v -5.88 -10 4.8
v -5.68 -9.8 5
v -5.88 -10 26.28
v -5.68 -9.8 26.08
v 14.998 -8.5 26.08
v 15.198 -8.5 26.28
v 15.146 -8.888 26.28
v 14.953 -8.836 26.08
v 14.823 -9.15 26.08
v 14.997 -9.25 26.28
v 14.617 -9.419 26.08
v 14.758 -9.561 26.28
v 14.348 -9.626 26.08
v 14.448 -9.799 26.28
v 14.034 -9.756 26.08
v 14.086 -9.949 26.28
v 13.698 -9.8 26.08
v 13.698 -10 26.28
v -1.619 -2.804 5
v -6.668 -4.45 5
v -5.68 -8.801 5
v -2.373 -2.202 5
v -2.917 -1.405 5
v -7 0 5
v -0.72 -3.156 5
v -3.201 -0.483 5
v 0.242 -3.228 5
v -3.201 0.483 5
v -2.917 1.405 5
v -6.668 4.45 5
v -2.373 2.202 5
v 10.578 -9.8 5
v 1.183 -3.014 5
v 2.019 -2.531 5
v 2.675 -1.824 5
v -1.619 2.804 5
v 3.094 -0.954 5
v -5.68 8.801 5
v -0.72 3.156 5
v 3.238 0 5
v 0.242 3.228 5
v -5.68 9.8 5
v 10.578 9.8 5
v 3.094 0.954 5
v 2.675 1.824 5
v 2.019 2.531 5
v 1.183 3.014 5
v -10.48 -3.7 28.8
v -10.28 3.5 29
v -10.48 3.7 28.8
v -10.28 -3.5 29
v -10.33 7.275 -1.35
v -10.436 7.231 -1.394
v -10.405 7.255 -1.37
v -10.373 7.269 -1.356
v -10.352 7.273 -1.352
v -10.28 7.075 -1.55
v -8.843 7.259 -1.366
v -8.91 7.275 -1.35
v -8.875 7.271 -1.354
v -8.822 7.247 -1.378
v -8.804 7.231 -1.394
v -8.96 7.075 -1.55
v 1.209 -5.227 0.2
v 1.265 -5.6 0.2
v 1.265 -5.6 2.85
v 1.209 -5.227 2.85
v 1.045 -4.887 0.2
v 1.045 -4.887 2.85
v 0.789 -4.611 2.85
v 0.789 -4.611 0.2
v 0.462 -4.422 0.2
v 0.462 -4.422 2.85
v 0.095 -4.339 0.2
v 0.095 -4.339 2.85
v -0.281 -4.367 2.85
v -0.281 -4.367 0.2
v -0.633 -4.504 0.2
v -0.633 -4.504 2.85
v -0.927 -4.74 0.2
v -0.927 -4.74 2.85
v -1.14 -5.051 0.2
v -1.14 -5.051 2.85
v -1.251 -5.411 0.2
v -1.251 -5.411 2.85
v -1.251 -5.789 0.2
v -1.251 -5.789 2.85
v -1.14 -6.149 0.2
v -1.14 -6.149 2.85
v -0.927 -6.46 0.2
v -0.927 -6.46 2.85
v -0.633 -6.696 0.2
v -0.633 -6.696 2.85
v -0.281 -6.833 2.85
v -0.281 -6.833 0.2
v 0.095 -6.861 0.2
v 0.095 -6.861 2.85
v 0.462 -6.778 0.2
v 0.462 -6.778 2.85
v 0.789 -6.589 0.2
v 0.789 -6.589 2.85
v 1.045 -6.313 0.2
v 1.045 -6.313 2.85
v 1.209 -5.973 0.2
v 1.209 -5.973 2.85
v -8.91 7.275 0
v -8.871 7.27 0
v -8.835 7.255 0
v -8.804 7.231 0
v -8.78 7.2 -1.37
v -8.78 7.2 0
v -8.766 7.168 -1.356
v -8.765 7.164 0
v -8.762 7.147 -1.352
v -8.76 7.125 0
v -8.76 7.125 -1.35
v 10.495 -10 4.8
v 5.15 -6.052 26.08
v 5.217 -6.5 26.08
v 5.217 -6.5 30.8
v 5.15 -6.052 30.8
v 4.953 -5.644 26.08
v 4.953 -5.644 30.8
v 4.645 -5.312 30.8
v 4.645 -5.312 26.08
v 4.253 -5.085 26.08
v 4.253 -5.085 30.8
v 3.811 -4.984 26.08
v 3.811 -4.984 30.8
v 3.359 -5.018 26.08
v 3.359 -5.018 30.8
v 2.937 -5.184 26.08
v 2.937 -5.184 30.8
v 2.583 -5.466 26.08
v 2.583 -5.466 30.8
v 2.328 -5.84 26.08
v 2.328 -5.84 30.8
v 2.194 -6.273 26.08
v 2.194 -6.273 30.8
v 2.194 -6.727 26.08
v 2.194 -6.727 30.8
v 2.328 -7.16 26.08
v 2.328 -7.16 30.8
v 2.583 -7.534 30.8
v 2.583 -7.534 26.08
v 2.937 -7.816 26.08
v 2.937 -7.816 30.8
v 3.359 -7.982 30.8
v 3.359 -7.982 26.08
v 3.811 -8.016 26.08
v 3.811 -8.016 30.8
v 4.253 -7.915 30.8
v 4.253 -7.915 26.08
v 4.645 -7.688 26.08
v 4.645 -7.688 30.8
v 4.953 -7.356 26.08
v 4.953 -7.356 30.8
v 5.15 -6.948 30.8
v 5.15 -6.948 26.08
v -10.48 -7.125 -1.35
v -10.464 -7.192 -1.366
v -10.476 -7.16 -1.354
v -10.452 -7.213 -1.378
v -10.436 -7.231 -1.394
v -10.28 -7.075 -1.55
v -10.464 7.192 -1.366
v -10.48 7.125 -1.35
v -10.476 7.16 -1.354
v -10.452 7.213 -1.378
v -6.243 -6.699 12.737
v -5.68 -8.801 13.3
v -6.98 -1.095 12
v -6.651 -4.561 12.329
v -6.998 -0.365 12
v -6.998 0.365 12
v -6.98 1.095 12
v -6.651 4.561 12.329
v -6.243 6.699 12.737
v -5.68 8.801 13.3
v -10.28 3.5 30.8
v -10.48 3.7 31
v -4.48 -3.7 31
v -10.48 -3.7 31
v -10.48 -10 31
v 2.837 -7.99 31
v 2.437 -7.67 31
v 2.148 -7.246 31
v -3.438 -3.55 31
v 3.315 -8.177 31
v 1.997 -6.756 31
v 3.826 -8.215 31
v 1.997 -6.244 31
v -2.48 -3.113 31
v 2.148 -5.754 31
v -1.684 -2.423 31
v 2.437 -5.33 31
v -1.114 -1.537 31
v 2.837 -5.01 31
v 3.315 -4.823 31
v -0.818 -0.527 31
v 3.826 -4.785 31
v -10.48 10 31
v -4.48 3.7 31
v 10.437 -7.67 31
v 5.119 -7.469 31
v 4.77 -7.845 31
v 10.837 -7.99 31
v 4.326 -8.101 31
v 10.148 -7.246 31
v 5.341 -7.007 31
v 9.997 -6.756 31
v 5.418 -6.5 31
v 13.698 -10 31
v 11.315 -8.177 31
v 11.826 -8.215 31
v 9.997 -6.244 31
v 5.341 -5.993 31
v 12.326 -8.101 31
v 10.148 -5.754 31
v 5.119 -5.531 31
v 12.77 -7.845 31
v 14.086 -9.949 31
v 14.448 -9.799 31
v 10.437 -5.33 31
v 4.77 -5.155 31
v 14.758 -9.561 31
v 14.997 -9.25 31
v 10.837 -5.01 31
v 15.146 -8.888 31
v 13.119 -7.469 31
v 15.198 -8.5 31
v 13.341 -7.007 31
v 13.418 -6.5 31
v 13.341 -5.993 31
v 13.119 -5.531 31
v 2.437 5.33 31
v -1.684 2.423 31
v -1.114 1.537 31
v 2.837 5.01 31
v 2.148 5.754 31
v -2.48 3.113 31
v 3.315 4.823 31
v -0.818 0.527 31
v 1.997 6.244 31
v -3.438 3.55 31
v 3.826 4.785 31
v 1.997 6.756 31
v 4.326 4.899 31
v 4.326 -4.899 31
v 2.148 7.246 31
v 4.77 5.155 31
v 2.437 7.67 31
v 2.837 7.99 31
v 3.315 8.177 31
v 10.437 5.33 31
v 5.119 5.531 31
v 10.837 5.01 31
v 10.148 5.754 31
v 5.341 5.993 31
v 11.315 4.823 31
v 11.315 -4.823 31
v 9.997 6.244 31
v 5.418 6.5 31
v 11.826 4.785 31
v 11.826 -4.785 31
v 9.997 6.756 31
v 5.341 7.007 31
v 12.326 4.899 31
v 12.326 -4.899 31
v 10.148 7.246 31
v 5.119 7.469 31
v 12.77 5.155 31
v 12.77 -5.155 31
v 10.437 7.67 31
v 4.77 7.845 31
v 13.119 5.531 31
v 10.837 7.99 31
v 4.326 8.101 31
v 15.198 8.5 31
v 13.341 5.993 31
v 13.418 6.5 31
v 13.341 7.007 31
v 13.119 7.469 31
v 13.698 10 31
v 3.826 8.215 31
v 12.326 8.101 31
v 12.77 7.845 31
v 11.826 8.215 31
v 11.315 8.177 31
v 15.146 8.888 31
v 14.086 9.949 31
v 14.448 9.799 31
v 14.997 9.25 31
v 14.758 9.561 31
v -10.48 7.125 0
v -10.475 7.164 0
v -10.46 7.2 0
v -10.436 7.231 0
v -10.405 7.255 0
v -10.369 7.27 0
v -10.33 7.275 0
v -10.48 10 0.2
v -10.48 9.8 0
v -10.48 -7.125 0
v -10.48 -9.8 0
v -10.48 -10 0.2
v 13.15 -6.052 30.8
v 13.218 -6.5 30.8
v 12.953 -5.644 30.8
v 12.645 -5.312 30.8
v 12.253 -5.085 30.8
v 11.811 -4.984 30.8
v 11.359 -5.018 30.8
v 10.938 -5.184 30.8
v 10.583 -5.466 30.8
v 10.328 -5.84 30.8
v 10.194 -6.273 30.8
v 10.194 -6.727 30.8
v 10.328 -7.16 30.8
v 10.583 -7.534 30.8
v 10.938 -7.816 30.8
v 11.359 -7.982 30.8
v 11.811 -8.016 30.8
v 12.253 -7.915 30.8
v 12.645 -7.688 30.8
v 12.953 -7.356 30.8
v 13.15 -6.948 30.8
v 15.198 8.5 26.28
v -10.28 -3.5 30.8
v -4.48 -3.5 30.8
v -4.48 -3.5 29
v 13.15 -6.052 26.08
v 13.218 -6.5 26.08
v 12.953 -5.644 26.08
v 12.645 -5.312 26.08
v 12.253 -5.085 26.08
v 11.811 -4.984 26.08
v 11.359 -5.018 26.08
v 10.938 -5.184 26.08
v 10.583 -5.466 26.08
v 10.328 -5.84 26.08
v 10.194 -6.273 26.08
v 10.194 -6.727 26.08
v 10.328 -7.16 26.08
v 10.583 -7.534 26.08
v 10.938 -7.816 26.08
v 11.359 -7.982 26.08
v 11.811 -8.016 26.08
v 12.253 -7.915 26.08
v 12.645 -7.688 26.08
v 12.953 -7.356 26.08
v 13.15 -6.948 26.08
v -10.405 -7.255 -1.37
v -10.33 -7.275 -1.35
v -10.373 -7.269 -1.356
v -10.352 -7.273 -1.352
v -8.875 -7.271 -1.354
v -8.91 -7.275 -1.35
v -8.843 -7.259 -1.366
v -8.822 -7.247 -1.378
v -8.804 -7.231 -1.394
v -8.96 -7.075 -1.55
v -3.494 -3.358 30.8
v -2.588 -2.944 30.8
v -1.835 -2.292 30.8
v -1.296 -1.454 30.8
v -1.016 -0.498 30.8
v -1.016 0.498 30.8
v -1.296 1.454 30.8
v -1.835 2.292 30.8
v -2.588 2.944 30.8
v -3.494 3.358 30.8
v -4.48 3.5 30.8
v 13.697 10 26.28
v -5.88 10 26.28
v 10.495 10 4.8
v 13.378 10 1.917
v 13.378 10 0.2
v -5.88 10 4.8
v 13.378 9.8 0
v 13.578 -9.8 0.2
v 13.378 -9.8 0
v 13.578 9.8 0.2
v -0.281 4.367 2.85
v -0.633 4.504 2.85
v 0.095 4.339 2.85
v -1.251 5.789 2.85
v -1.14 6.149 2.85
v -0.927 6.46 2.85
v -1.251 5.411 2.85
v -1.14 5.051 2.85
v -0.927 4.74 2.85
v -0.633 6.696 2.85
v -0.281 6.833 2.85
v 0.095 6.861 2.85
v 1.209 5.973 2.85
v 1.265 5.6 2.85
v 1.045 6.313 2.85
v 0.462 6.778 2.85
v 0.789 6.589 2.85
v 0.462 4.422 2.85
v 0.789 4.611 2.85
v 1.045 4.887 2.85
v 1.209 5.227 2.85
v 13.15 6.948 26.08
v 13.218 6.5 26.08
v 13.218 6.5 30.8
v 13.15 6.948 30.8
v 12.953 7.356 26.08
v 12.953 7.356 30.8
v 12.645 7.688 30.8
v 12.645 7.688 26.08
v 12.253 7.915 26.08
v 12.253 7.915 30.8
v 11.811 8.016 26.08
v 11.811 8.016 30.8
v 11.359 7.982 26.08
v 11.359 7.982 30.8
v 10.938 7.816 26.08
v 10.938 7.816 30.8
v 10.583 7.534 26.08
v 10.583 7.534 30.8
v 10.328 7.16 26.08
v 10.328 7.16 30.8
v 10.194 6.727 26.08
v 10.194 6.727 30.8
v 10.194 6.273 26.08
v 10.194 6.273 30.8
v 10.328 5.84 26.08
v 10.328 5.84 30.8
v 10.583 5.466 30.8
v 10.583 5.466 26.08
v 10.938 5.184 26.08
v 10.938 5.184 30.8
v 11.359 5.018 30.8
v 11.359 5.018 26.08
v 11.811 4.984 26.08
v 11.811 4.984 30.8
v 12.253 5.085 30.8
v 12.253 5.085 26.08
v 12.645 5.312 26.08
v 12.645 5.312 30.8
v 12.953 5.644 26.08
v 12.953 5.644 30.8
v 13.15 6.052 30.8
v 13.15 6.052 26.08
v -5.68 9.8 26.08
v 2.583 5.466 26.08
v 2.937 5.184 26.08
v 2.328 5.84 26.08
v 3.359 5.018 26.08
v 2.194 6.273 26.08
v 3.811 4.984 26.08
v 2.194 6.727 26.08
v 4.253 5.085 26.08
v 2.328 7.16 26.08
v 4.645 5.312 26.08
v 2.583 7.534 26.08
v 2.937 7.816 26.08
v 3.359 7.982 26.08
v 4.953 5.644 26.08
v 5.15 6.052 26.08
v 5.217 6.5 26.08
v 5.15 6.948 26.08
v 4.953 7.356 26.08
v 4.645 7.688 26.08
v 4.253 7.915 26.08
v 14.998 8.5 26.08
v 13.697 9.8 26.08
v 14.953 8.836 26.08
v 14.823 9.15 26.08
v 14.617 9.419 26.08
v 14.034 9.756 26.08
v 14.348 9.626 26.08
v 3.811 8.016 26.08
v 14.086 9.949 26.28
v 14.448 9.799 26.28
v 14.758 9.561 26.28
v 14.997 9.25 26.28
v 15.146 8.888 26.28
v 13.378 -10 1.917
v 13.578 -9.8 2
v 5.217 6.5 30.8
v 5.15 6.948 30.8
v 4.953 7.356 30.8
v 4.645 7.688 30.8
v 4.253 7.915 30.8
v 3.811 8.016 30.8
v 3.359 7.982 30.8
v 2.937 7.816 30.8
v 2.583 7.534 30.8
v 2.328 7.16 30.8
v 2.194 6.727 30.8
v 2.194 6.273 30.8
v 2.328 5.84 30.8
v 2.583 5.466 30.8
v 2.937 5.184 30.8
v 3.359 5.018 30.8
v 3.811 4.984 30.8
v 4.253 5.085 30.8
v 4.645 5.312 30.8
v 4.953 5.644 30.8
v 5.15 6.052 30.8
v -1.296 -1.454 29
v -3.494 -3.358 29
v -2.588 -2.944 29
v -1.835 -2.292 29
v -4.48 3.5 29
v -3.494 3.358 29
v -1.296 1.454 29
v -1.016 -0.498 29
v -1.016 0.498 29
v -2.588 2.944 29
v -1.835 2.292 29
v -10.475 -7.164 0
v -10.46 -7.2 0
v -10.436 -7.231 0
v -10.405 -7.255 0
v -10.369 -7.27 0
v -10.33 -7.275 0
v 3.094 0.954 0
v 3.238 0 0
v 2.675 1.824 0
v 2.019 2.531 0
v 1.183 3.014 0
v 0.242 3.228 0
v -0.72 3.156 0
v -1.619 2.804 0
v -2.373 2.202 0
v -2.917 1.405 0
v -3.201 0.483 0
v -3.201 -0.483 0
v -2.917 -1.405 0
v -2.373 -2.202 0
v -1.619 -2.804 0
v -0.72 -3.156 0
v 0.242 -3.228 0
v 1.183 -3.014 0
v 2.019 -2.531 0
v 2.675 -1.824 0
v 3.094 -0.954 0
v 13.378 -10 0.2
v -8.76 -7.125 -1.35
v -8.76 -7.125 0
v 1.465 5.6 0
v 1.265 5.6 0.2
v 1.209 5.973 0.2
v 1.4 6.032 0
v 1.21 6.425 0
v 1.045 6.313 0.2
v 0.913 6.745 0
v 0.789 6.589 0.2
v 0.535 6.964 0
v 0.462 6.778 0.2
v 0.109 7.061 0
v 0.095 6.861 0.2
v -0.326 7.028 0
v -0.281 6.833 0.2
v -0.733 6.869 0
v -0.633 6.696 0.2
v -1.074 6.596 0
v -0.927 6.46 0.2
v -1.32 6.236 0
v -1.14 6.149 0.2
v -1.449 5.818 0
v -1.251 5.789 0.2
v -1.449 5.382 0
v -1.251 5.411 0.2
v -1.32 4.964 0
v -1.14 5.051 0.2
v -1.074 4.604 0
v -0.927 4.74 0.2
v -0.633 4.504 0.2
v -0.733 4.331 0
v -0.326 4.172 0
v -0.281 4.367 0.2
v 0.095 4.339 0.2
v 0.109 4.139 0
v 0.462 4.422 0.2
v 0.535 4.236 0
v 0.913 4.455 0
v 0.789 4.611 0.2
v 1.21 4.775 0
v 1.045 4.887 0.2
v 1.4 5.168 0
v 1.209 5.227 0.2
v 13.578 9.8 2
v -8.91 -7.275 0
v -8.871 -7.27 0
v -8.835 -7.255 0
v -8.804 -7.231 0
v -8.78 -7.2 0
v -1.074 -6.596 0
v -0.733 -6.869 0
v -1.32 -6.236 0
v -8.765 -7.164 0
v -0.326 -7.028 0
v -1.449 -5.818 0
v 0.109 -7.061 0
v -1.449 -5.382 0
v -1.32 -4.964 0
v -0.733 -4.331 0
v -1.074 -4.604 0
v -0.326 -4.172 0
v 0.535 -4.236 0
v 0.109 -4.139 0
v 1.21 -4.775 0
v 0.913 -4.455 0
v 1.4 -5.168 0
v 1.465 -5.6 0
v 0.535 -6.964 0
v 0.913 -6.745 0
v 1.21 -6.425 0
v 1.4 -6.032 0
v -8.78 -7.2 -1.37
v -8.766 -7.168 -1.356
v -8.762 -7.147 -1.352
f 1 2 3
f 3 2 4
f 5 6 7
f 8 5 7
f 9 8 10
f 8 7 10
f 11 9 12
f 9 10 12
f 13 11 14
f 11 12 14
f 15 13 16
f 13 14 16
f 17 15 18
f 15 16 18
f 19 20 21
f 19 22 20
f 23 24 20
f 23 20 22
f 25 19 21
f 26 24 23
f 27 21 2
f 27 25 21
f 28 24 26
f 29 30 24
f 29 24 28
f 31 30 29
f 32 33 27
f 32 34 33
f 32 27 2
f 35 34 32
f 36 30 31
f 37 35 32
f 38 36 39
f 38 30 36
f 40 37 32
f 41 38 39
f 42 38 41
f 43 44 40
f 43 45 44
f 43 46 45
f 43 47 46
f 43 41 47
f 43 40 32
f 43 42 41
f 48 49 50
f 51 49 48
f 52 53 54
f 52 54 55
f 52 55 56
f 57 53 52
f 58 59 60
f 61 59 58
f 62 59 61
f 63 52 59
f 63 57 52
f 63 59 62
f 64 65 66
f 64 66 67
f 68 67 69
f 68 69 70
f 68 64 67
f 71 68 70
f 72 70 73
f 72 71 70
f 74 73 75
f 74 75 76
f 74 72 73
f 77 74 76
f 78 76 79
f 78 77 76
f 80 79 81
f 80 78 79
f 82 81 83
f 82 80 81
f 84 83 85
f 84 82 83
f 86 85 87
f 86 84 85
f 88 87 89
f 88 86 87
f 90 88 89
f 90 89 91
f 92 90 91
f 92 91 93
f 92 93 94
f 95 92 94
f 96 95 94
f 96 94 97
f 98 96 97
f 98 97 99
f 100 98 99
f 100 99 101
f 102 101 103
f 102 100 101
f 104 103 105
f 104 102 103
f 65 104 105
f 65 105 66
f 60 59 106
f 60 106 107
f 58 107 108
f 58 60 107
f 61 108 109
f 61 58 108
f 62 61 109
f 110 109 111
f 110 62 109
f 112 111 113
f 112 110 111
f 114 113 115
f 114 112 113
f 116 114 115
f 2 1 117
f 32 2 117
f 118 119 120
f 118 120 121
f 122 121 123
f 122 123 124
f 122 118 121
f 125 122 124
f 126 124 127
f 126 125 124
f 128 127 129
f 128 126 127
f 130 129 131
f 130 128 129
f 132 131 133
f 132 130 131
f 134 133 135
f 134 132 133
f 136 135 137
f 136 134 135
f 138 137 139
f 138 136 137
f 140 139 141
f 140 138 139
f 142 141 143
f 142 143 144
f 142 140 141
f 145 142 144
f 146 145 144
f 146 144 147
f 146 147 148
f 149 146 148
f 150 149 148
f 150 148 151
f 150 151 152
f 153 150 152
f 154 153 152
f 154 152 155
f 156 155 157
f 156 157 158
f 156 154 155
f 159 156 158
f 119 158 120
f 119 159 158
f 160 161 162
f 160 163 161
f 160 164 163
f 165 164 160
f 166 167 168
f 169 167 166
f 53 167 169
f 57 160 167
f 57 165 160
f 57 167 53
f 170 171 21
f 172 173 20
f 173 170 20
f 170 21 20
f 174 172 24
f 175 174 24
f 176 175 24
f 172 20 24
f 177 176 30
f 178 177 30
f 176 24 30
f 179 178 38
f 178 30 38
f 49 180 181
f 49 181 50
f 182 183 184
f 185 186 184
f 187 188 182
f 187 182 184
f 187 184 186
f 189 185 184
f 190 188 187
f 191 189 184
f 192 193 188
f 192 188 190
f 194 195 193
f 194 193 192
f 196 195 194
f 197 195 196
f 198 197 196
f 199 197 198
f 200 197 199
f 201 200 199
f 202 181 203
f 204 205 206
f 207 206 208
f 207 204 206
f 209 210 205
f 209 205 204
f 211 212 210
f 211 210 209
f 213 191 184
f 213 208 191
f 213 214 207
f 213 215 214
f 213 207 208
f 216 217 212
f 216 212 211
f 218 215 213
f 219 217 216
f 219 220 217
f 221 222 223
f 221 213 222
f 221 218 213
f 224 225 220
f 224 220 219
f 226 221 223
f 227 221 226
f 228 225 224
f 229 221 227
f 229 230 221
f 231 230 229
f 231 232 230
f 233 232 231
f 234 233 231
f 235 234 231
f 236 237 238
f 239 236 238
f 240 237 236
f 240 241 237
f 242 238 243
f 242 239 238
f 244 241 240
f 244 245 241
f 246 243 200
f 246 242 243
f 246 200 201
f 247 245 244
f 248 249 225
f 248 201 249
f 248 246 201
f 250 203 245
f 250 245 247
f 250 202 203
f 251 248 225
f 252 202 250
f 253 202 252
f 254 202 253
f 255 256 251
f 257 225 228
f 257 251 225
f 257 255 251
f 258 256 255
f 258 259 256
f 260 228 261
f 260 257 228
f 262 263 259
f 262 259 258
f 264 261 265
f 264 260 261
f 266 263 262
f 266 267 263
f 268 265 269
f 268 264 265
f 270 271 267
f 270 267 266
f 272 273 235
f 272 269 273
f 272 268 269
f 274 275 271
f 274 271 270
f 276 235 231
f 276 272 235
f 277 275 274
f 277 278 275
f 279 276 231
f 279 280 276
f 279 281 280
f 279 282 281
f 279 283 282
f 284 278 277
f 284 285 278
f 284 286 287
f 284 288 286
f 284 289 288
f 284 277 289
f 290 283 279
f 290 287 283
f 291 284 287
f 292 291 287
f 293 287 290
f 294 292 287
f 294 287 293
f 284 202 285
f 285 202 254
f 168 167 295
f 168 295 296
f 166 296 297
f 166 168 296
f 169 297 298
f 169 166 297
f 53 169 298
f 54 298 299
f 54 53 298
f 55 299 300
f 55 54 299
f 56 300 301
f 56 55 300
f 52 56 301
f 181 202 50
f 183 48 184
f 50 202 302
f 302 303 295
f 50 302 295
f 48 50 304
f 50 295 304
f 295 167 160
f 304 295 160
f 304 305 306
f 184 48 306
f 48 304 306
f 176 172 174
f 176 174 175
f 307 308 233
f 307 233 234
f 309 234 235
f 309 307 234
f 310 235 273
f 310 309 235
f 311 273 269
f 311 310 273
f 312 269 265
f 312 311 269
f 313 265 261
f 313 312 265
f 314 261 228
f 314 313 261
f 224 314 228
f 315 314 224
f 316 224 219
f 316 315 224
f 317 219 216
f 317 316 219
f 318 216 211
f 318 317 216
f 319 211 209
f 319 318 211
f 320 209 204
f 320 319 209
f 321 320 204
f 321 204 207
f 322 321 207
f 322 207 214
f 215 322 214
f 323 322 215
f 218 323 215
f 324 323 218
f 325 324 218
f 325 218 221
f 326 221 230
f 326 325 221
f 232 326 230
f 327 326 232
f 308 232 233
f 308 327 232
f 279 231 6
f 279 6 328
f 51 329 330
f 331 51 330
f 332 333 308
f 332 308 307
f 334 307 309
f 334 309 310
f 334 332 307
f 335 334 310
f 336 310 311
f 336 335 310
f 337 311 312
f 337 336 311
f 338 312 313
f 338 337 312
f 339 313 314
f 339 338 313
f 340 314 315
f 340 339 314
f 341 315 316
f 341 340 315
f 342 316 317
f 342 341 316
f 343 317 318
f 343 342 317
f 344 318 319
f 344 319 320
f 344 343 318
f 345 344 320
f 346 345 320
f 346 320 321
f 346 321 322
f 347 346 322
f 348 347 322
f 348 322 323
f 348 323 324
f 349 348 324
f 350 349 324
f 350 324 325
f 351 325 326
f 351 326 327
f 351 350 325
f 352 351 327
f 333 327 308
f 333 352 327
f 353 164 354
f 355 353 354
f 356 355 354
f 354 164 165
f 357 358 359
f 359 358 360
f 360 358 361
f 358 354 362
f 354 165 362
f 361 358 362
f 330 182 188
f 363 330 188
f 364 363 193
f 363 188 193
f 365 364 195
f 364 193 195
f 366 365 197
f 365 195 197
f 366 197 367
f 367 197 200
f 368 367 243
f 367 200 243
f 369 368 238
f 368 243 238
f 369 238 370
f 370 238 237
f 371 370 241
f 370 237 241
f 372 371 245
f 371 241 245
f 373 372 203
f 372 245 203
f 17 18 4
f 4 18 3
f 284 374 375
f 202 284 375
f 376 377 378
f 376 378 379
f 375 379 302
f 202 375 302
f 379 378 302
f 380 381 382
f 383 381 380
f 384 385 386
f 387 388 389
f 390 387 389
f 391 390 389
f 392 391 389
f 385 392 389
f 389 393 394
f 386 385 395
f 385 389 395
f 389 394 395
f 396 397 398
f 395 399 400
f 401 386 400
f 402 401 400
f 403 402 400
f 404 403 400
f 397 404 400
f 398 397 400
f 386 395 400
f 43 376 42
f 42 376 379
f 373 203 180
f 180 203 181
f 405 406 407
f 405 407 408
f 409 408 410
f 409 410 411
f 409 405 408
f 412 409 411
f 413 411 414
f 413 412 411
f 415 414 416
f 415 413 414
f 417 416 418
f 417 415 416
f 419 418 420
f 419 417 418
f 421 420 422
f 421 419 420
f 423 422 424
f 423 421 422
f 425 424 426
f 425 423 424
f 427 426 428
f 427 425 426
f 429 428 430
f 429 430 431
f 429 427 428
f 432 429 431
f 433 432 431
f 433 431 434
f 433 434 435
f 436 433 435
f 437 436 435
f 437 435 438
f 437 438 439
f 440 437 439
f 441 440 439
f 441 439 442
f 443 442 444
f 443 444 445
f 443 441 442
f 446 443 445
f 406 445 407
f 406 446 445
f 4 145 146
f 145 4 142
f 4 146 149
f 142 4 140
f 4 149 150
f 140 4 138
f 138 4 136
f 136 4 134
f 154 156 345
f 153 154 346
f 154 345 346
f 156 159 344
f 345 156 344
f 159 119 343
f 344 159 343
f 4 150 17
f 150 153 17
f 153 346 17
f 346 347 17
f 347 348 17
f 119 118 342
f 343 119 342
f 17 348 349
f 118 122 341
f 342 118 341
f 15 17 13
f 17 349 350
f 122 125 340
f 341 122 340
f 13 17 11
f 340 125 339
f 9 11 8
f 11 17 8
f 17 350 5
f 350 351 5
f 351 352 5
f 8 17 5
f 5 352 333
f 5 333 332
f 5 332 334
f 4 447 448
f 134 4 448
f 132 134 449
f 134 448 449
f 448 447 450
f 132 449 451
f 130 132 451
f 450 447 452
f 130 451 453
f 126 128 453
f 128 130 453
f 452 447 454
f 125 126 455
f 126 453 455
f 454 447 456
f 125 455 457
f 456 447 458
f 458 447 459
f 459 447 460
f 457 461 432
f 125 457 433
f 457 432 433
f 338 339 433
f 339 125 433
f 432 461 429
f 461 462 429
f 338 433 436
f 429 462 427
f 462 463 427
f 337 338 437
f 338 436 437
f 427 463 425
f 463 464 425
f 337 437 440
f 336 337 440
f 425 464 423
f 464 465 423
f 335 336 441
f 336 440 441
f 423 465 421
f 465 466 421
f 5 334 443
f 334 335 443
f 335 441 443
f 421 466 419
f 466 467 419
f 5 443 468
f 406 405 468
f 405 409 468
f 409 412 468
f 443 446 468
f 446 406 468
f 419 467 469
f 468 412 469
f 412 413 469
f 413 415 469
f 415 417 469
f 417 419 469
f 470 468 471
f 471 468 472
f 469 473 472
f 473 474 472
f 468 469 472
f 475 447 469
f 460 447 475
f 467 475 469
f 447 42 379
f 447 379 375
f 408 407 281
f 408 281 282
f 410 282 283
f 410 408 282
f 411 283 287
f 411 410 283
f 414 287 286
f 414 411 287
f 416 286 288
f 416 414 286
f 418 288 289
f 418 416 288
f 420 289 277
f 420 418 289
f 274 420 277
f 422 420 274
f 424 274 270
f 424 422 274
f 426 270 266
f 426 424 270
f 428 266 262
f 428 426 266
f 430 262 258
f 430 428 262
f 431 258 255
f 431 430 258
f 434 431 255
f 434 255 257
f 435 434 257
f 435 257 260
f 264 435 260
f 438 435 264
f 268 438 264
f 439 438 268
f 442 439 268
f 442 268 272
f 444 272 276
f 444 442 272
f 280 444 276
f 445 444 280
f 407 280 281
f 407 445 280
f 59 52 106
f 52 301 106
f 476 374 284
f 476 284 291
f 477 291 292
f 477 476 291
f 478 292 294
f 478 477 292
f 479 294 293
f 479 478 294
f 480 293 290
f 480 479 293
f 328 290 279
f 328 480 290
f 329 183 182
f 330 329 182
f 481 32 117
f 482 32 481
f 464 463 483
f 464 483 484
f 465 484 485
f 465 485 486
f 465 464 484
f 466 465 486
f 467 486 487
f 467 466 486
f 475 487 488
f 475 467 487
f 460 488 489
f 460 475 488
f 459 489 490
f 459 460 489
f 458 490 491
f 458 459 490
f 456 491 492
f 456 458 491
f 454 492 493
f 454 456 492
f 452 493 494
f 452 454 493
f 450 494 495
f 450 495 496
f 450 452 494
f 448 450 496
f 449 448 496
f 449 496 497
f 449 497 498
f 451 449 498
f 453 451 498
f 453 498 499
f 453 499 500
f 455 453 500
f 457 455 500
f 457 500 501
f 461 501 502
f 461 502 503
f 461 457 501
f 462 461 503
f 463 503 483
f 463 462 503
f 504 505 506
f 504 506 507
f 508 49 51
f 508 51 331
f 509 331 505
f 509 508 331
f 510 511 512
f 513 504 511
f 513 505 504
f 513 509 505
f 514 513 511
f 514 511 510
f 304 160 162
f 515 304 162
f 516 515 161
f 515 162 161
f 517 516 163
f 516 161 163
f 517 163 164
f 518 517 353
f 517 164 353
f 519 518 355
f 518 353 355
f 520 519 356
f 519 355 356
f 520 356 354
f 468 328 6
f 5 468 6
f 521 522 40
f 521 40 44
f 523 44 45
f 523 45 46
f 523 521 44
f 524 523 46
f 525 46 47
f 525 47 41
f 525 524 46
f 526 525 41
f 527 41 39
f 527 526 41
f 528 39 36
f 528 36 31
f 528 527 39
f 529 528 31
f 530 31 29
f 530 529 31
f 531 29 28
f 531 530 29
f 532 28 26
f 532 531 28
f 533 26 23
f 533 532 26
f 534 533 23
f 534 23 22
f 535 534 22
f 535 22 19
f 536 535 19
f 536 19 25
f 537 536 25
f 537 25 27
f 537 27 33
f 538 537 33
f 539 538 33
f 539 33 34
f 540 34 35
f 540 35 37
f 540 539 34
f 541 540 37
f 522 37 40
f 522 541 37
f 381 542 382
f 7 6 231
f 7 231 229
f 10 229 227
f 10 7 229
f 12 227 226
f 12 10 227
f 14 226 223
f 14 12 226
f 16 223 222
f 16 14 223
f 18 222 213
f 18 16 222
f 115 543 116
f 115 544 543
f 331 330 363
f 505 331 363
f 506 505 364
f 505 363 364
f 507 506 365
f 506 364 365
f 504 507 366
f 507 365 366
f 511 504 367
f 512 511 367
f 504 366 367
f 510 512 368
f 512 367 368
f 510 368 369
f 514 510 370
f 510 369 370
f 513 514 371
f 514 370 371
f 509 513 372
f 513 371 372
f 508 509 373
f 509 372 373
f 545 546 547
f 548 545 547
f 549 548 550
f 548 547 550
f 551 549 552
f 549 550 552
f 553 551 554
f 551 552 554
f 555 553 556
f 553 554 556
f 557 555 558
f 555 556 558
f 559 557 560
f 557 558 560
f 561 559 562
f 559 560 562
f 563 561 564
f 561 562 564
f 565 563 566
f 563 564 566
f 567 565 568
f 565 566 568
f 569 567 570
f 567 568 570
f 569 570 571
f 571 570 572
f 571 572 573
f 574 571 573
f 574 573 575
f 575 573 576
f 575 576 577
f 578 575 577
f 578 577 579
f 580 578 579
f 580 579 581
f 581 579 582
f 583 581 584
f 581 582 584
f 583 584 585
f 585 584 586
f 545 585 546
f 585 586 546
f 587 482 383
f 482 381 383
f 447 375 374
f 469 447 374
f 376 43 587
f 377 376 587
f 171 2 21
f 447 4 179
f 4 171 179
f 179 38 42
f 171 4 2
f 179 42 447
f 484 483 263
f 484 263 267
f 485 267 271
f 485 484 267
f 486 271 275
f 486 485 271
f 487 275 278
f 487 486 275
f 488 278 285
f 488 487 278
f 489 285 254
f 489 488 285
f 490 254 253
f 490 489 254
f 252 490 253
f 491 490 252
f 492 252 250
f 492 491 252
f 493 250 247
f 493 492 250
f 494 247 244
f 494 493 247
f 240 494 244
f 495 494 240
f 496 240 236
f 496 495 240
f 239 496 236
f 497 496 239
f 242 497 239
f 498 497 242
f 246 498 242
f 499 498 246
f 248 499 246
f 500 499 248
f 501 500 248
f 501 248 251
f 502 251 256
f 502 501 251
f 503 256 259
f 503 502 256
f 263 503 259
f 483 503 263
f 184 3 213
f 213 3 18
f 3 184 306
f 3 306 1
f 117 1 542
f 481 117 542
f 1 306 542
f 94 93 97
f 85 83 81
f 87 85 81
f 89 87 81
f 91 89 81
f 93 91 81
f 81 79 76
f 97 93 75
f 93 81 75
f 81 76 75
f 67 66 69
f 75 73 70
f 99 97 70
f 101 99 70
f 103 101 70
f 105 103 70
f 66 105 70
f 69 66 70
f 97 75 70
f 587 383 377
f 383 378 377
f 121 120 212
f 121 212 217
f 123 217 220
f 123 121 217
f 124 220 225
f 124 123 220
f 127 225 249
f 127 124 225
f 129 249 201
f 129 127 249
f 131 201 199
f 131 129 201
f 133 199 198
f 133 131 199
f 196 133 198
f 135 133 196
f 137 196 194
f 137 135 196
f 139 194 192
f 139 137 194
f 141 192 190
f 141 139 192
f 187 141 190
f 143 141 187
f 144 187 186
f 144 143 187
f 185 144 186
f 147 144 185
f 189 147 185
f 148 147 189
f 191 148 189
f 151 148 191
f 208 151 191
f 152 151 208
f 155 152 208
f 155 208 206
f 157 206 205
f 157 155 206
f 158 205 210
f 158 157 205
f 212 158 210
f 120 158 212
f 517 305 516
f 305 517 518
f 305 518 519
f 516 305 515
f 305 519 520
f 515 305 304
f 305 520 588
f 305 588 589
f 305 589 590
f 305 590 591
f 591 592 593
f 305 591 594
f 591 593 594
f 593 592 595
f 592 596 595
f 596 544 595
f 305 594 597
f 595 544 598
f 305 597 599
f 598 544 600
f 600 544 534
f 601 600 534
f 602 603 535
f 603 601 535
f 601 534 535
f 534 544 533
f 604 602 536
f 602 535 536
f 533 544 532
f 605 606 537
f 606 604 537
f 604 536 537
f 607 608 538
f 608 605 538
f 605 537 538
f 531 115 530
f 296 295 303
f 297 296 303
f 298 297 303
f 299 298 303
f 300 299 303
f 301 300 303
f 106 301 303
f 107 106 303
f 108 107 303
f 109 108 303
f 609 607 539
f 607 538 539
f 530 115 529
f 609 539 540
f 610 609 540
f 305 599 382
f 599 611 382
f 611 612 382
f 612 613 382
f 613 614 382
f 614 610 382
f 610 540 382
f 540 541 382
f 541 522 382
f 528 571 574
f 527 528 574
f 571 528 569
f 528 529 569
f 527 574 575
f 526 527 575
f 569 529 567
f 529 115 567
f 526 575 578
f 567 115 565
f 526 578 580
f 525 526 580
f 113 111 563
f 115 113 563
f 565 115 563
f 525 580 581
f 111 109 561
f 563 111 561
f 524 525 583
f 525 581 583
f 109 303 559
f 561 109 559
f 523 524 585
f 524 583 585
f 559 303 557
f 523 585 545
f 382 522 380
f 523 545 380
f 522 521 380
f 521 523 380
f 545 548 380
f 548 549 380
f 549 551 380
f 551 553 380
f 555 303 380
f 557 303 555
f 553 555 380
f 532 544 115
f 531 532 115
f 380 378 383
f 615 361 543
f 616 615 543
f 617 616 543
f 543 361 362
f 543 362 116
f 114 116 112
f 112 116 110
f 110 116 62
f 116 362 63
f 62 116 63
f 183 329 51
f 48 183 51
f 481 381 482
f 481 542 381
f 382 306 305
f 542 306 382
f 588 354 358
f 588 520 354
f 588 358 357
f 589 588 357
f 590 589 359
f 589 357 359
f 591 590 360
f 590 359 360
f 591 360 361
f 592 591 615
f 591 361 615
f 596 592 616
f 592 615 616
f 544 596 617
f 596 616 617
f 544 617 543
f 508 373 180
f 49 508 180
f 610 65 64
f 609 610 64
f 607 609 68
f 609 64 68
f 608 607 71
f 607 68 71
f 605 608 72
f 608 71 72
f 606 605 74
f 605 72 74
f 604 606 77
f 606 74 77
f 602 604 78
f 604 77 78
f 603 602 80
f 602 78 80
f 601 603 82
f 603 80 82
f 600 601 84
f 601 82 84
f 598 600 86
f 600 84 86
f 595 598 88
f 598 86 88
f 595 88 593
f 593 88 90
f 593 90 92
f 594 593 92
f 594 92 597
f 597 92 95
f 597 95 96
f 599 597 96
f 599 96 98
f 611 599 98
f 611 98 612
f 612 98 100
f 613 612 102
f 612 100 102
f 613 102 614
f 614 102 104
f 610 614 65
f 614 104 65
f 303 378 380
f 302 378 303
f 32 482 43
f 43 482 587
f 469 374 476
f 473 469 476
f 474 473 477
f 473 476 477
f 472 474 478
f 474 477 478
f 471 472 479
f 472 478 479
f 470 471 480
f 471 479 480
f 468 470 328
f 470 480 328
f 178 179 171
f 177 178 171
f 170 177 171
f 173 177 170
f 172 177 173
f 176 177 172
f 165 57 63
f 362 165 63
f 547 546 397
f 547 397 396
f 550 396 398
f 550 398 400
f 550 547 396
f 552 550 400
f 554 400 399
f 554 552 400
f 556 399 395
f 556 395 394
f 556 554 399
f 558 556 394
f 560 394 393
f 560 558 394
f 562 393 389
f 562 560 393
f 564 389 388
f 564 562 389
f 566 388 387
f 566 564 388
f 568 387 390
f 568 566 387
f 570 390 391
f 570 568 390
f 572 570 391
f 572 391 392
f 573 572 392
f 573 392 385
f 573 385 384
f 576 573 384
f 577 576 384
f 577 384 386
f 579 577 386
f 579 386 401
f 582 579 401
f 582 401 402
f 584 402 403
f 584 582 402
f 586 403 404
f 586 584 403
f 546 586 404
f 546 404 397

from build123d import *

# Parameters (mm, degrees)
SKETCH_1_R          = 3.2375
EXTRUDE_1_DEPTH     = 5
SKETCH_2_R          = 1.265
CUT_EXTRUDE_1_DEPTH = 2.85
CHAMFER_1_SIZE      = 0.2
SKETCH_5_W          = 1.72
SKETCH_5_H          = 14.55
EXTRUDE_2_DEPTH     = 1.55
CHAMFER_2_SIZE      = 0.2
FILLET_1_R          = 0.15
SKETCH_6_W          = 4.8
SKETCH_6_H          = 20
EXTRUDE_3_DEPTH     = 31
EXTRUDE_START       = 31
SKETCH_7_W          = 25.9
SKETCH_7_H          = 20
EXTRUDE_4_DEPTH     = 4.92
CUT_EXTRUDE_START   = 26.08
SKETCH_8_R          = 1.52
CUT_EXTRUDE_2_DEPTH = 4.92
CHAMFER_3_SIZE      = 0.2
CUT_EXTRUDE_START_2 = 31
SKETCH_10_W         = 4.38
SKETCH_10_H         = 20
CUT_EXTRUDE_3_DEPTH = 31
FILLET_2_R          = 1.5
CUT_EXTRUDE_4_DEPTH = 2
SKETCH_13_W         = 3.2
SKETCH_13_H         = 20
EXTRUDE_5_DEPTH     = 5
CHAMFER_5_SIZE      = 3
CUT_EXTRUDE_START_3 = 5
CUT_EXTRUDE_5_DEPTH = 7
CHAMFER_7_SIZE      = 1.3
CHAMFER_8_SIZE      = 0.2


with BuildPart() as part:
    # 草图1 → 凸台-拉伸1 (new body)
    with BuildSketch(Plane.XY):
        Polygon((13.5775, 0), (13.5775, 10), (-10.48, 10), (-10.48, 0), (-10.48, -10), (13.5775, -10), align=None)
        Circle(SKETCH_1_R, mode=Mode.SUBTRACT)
    extrude(amount=EXTRUDE_1_DEPTH)

    # 草图2 → 切除-拉伸1 (cut)
    with BuildSketch(Plane.XY):
        with Locations((0, 5.6)):
            Circle(SKETCH_2_R)
        with Locations((0, -5.6)):
            Circle(SKETCH_2_R)
    extrude(amount=CUT_EXTRUDE_1_DEPTH, mode=Mode.SUBTRACT)

    # 倒角1
    chamfer_1_edges = [part.edges().sort_by_distance(p)[0] for p in [
        (-1.265, 5.6, 0),
        (-1.265, -5.6, 0),
    ]]
    chamfer(chamfer_1_edges, length=CHAMFER_1_SIZE)

    # 草图5 → 凸台-拉伸2 (add)
    with BuildSketch(Plane.XY):
        with Locations((-9.62, 0)):
            Rectangle(SKETCH_5_W, SKETCH_5_H)
    extrude(amount=-EXTRUDE_2_DEPTH)

    # 倒角2
    chamfer_2_edges = [part.edges().sort_by_distance(p)[0] for p in [
        (-10.48, 0, -1.55),
        (-9.62, 7.275, -1.55),
        (-8.76, 0, -1.55),
        (-9.62, -7.275, -1.55),
    ]]
    chamfer(chamfer_2_edges, length=CHAMFER_2_SIZE)

    # 圆角1
    fillet_1_edges = [part.edges().sort_by_distance(p)[0] for p in [
        (-8.76, -7.275, -0.675),
        (-8.76, 7.275, -0.675),
        (-10.48, -7.275, -0.675),
        (-10.48, 7.275, -0.675),
    ]]
    fillet(fillet_1_edges, radius=FILLET_1_R)

    # 草图6 → 凸台-拉伸3 (add)
    with BuildSketch(Plane.XY):
        with Locations((-8.08, 0)):
            Rectangle(SKETCH_6_W, SKETCH_6_H)
    extrude(amount=EXTRUDE_3_DEPTH)

    # 草图7 → 凸台-拉伸4 (add)
    with BuildSketch(Plane.XY.offset(EXTRUDE_START)):
        with Locations((6.6275, 0)):
            Rectangle(SKETCH_7_W, SKETCH_7_H)
    extrude(amount=-EXTRUDE_4_DEPTH)

    # 草图8 → 切除-拉伸2 (cut)
    with BuildSketch(Plane.XY.offset(CUT_EXTRUDE_START)):
        with Locations((3.6975, 6.5)):
            Circle(SKETCH_8_R)
        with Locations((11.6975, 6.5)):
            Circle(SKETCH_8_R)
        with Locations((11.6975, -6.5)):
            Circle(SKETCH_8_R)
        with Locations((3.6975, -6.5)):
            Circle(SKETCH_8_R)
    extrude(amount=CUT_EXTRUDE_2_DEPTH, mode=Mode.SUBTRACT)

    # 倒角3
    chamfer_3_edges = [part.edges().sort_by_distance(p)[0] for p in [
        (2.1775, -6.5, 31),
        (10.1775, -6.5, 31),
        (10.1775, 6.5, 31),
        (2.1775, 6.5, 31),
    ]]
    chamfer(chamfer_3_edges, length=CHAMFER_3_SIZE)

    # 草图10 → 切除-拉伸3 (cut)
    with BuildSketch(Plane.XY.offset(CUT_EXTRUDE_START_2)):
        with Locations((17.3875, 0)):
            Rectangle(SKETCH_10_W, SKETCH_10_H)
    extrude(amount=-CUT_EXTRUDE_3_DEPTH, mode=Mode.SUBTRACT)

    # 圆角2
    fillet_2_edges = [part.edges().sort_by_distance(p)[0] for p in [
        (15.1975, -10, 28.54),
        (15.1975, 10, 28.54),
    ]]
    fillet(fillet_2_edges, radius=FILLET_2_R)

    # 草图11 → 切除-拉伸4 (cut)
    with BuildSketch(Plane.XY.offset(CUT_EXTRUDE_START_2)):
        with BuildLine():
            Line((-4.48, 3.5), (-10.48, 3.5))
            Line((-10.48, 3.5), (-10.48, -3.5))
            Line((-10.48, -3.5), (-4.48, -3.5))
            ThreePointArc((-4.48, -3.5), (-0.98, 0), (-4.48, 3.5))
        make_face()
    extrude(amount=-CUT_EXTRUDE_4_DEPTH, mode=Mode.SUBTRACT)

    # 草图13 → 凸台-拉伸5 (add)
    with BuildSketch(Plane.XY):
        with Locations((10.798987738, 0)):
            Rectangle(SKETCH_13_W, SKETCH_13_H)
    extrude(amount=EXTRUDE_5_DEPTH)

    # 倒角5
    chamfer_5_edges = [part.edges().sort_by_distance(p)[0] for p in [
        (13.5775, 0, 5),
    ]]
    chamfer(chamfer_5_edges, length=CHAMFER_5_SIZE)

    # 草图14 → 切除-拉伸5 (cut)
    with BuildSketch(Plane.XY.offset(CUT_EXTRUDE_START_3)):
        with BuildLine():
            Line((-5.284271247, 10), (-5.284271247, -10))
            ThreePointArc((-5.284271247, -10), (-7, 0), (-5.284271247, 10))
        make_face()
    extrude(amount=CUT_EXTRUDE_5_DEPTH, mode=Mode.SUBTRACT)

    # 倒角7
    chamfer_7_edges = [part.edges().sort_by_distance(p)[0] for p in [
        (-5.68, 0, 12),
    ]]
    chamfer(chamfer_7_edges, length=CHAMFER_7_SIZE)

    # 倒角8
    chamfer_8_edges = [part.edges().sort_by_distance(p)[0] for p in [
        (2.44875, -10, 5),
        (-5.68, -10, 15.54),
        (-5.68, 10, 15.54),
        (4.00875, 10, 26.08),
        (4.00875, -10, 26.08),
        (15.1975, 0, 26.08),
        (14.758160172, 9.560660172, 26.08),
        (14.758160172, -9.560660172, 26.08),
        (-7.48, 3.5, 31),
        (-10.48, 3.5, 30),
        (-7.48, -3.5, 31),
        (-10.48, -3.5, 30),
        (-10.48, 0, 29),
        (-0.98, 0, 31),
        (2.44875, 10, 5),
        (13.5775, 10, 1),
        (12.0775, 10, 3.5),
        (13.5775, -10, 1),
        (12.0775, -10, 3.5),
        (1.54875, -10, 0),
        (1.54875, 10, 0),
        (13.5775, 0, 0),
    ]]
    chamfer(chamfer_8_edges, length=CHAMFER_8_SIZE)


solid = part.part
